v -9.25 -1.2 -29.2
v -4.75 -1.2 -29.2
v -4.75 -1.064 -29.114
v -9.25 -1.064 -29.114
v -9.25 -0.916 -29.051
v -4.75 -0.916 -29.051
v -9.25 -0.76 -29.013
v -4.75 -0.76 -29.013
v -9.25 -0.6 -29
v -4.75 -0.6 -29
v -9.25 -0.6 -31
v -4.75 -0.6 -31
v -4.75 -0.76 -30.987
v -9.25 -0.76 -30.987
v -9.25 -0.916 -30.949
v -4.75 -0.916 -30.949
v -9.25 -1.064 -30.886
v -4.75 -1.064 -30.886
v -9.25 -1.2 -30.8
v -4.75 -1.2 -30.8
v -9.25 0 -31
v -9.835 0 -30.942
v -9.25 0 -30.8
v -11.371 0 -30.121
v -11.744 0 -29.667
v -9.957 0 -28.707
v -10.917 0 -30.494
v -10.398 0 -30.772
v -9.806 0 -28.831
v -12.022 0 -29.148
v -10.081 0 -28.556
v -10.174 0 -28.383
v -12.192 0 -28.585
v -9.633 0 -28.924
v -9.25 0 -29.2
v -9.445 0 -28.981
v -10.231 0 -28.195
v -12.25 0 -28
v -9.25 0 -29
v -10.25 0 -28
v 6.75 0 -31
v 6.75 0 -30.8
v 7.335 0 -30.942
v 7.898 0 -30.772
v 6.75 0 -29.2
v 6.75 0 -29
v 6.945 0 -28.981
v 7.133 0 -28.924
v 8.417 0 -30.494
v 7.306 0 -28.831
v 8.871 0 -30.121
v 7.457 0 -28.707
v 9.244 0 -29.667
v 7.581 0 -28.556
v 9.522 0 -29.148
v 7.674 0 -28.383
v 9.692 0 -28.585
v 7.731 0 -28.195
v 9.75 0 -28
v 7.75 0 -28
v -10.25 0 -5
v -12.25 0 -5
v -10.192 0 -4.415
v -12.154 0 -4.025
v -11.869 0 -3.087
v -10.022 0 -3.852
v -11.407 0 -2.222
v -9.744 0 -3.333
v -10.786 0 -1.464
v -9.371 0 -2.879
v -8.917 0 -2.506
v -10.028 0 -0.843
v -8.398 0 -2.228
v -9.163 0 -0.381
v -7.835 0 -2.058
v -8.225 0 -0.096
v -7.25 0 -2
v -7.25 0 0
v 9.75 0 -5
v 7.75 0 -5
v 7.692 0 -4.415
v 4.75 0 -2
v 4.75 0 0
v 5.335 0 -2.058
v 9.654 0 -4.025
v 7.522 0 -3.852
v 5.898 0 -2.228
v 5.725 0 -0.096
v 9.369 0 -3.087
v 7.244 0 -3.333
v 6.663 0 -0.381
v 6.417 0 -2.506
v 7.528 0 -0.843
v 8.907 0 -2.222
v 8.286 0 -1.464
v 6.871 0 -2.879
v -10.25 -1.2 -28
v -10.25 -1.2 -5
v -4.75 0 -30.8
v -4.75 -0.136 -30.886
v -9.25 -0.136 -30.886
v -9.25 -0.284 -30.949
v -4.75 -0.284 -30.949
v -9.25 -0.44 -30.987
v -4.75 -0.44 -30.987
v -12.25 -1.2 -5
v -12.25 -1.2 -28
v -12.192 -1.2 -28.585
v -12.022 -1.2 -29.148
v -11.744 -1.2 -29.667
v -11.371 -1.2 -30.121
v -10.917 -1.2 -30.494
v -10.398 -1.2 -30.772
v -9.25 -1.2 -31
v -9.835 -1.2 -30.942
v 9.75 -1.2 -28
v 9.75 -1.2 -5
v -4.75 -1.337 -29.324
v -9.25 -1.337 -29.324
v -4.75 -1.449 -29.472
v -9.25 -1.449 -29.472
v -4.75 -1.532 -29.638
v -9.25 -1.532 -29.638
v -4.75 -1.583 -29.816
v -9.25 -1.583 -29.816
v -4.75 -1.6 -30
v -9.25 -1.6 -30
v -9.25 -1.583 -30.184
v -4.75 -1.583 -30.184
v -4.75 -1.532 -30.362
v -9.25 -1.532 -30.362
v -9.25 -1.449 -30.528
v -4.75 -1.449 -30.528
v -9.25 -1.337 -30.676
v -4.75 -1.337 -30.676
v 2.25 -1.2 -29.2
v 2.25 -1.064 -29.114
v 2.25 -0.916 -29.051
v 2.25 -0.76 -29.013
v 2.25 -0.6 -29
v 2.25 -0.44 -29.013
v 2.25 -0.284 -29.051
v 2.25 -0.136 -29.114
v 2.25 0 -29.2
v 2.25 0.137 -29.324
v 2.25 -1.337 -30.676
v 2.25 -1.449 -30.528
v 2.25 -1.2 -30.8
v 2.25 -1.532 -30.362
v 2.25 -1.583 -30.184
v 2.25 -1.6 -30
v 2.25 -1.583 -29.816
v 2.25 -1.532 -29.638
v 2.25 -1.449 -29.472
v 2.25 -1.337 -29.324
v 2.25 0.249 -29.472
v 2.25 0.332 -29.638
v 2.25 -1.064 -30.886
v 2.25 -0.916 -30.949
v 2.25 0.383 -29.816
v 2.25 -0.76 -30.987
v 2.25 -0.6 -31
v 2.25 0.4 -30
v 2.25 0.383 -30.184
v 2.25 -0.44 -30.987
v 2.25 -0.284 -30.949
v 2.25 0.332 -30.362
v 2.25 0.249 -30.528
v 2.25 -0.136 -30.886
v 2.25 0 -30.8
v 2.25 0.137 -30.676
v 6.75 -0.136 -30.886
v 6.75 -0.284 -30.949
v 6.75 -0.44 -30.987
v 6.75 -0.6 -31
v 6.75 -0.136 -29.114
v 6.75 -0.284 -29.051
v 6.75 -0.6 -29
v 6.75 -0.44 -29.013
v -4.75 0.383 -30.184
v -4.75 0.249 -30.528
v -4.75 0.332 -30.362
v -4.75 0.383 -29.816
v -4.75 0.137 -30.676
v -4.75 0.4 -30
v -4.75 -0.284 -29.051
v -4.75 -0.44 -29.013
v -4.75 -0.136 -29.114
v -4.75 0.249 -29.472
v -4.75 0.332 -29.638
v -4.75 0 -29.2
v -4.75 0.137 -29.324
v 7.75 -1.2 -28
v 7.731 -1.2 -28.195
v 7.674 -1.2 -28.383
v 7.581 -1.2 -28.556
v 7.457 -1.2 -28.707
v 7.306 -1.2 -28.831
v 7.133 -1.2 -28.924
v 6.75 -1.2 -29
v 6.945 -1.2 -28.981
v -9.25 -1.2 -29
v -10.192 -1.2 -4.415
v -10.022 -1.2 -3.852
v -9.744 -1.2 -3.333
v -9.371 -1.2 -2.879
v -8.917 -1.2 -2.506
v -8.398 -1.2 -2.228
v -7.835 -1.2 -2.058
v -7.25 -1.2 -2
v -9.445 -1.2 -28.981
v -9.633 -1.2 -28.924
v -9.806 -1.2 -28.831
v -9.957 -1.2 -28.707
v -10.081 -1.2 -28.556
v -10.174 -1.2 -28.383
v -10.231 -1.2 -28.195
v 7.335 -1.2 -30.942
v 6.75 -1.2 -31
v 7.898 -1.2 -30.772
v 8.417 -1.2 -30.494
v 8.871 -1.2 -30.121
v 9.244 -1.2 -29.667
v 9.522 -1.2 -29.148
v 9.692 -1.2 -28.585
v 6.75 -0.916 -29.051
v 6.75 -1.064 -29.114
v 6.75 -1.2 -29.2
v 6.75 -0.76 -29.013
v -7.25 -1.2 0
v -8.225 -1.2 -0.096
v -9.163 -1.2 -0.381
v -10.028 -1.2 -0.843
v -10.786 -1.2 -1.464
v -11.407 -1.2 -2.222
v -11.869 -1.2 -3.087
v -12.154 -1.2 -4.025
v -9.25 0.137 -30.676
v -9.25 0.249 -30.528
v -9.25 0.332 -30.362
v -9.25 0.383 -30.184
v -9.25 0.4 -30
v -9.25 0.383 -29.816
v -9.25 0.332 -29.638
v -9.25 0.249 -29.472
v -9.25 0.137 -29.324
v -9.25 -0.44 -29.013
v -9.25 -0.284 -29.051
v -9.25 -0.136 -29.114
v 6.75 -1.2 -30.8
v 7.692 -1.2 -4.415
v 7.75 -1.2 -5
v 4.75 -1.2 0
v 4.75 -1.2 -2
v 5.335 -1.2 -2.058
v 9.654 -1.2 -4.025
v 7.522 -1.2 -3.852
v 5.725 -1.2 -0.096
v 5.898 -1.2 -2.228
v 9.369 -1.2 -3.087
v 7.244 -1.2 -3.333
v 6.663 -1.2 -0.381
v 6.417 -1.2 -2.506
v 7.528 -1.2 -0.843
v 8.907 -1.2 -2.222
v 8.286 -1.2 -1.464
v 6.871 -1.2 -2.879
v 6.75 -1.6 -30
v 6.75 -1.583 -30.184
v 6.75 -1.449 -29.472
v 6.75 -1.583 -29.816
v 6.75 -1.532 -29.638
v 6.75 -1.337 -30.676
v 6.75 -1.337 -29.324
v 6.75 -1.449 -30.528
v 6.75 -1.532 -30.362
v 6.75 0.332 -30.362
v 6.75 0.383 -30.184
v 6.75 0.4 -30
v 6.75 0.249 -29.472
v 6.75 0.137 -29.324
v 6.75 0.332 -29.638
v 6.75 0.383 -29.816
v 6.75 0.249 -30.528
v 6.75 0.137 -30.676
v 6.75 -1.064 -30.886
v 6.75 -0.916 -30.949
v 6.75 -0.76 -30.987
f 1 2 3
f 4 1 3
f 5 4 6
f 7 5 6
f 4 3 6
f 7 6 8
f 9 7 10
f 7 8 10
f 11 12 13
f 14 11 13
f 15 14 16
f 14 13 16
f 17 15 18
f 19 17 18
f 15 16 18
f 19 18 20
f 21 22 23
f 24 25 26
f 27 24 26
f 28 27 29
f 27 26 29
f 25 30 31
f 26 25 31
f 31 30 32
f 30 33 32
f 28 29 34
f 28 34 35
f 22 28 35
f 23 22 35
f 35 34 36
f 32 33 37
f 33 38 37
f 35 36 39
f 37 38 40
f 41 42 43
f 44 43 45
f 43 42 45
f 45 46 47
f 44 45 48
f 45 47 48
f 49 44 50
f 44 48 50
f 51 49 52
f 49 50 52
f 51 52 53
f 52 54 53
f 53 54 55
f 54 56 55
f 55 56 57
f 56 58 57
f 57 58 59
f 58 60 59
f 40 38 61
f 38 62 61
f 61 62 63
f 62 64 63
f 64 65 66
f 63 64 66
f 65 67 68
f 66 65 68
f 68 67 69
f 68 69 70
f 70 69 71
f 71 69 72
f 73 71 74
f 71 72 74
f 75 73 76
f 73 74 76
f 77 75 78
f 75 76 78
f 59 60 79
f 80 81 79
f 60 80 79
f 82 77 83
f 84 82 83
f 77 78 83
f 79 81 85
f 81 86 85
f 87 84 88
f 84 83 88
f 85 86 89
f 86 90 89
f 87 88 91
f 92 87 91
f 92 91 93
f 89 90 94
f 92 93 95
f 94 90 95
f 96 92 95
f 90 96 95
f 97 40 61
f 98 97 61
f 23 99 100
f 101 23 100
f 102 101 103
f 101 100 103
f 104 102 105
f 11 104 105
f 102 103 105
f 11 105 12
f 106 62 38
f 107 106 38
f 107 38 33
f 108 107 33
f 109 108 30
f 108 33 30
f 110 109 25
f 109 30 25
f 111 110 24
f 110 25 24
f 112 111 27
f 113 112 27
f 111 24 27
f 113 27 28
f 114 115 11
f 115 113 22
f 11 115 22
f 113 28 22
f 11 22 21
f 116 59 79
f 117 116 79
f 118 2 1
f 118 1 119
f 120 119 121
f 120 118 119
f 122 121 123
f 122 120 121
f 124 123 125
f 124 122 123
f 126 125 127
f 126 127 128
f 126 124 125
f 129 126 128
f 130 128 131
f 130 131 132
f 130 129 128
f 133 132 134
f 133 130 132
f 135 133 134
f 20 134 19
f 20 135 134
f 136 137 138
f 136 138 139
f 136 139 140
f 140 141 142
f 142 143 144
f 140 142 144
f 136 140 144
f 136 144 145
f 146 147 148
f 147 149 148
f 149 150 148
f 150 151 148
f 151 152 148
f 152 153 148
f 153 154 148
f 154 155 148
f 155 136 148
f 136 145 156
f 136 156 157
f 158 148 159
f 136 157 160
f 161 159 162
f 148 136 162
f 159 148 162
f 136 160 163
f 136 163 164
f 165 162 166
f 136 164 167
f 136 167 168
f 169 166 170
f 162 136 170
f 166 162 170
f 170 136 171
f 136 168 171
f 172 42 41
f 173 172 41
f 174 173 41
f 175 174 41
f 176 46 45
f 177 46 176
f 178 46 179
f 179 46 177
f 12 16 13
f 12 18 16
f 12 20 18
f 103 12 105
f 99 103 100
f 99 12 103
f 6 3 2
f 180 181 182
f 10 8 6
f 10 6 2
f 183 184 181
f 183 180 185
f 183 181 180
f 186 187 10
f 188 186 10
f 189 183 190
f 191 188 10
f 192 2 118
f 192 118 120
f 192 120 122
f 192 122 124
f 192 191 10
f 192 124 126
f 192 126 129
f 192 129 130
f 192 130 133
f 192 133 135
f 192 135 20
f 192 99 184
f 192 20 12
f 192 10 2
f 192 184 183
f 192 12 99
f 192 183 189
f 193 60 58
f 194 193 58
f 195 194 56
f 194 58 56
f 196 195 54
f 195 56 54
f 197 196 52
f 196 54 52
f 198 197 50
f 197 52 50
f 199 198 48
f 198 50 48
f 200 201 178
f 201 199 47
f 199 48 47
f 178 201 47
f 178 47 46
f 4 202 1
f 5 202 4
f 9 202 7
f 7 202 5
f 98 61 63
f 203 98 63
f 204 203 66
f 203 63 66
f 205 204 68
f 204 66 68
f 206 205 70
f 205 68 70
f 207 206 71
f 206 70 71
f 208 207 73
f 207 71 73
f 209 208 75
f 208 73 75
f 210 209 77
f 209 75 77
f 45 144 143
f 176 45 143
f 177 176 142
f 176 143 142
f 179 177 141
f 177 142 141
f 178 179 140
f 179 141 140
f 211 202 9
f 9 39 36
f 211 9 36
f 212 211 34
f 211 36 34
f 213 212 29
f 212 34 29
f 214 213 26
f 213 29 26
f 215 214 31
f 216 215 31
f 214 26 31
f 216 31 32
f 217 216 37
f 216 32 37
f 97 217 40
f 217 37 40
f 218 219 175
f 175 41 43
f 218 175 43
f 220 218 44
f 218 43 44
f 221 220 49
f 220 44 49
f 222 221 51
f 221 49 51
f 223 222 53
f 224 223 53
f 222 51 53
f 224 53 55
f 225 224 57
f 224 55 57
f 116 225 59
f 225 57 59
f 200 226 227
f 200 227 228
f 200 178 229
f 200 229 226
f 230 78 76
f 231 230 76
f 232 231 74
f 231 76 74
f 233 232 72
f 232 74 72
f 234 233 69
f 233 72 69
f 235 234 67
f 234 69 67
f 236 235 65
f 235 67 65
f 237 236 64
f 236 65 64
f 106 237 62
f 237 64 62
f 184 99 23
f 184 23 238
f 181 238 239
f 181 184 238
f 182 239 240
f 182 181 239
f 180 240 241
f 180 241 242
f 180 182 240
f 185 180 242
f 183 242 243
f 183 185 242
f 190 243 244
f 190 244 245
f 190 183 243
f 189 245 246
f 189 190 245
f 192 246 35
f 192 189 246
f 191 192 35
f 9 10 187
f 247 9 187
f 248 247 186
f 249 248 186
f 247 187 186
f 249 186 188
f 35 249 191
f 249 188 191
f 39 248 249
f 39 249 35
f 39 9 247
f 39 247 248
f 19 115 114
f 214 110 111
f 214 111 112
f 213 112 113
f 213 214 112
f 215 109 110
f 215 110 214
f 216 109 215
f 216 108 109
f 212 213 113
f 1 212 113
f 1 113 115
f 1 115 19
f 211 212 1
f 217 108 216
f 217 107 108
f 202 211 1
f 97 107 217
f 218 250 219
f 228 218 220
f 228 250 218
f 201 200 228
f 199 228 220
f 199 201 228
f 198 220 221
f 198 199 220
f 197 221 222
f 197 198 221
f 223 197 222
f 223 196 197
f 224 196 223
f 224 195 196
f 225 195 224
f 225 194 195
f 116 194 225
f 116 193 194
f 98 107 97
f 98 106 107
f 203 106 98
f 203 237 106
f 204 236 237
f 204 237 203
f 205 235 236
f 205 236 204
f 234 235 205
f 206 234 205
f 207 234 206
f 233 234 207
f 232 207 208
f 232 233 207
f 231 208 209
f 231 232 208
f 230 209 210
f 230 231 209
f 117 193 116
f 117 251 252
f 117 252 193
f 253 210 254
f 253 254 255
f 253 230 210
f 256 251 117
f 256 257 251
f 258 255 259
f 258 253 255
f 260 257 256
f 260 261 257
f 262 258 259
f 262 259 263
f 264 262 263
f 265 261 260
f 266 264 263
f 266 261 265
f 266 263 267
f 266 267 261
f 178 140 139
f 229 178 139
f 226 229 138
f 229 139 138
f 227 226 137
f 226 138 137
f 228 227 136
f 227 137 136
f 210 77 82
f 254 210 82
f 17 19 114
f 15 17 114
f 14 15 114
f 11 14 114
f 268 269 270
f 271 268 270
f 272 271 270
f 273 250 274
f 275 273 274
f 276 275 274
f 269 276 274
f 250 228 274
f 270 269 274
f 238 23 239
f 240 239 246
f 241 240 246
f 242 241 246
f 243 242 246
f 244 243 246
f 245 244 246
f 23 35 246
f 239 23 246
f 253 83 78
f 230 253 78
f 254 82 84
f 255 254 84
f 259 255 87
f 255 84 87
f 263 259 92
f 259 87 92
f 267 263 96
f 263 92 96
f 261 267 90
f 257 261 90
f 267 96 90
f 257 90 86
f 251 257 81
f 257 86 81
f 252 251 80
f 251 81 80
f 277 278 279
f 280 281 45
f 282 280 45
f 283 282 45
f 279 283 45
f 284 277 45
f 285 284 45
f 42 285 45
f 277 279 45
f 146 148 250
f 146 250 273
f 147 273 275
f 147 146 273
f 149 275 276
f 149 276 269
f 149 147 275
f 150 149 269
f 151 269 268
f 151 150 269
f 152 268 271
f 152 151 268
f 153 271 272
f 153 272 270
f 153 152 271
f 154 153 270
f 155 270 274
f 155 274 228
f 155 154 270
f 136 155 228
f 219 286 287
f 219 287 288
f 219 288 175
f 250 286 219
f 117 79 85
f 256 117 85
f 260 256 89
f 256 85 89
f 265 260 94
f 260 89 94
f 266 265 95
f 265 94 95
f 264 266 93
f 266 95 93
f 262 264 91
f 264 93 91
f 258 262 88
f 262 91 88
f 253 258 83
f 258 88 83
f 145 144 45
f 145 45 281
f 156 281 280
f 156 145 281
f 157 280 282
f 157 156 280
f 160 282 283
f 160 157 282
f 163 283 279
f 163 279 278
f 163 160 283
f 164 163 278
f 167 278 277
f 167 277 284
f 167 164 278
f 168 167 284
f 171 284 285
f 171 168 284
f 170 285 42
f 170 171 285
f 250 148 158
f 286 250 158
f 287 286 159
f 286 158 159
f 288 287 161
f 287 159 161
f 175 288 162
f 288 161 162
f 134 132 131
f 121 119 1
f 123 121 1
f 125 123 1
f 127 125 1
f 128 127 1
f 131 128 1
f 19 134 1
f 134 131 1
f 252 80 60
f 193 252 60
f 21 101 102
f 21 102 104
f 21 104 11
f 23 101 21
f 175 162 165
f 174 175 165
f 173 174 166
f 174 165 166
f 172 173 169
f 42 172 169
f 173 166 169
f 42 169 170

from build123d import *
from build123d import SkipClean  # not in build123d's __all__

# Parameters (mm, degrees)
F1_DEPTH = 1.2
F3_DEPTH = 4.5
F4_DEPTH = 4.5
F6_DEPTH = 4.5
F7_DEPTH = 4.5


with BuildPart() as f1:
    # F0 (on Front) → F1 (new body)
    with BuildSketch(Plane.XZ):
        with BuildLine():
            Line((4.75, 0), (-7.25, 0))
            ThreePointArc((-7.25, 0), (-10.7855339059, -1.4644660941), (-12.25, -5))
            Line((-12.25, -5), (-12.25, -28))
            ThreePointArc((-12.25, -28), (-11.3713203436, -30.1213203436), (-9.25, -31))
            Line((-9.25, -31), (-4.75, -31))
            Line((-4.75, -31), (-4.75, -29))
            Line((-4.75, -29), (-9.25, -29))
            ThreePointArc((-9.25, -29), (-9.9571067812, -28.7071067812), (-10.25, -28))
            Line((-10.25, -28), (-10.25, -5))
            ThreePointArc((-10.25, -5), (-9.3713203436, -2.8786796564), (-7.25, -2))
            Line((-7.25, -2), (4.75, -2))
            ThreePointArc((4.75, -2), (6.8713203436, -2.8786796564), (7.75, -5))
            Line((7.75, -5), (7.75, -28))
            ThreePointArc((7.75, -28), (7.4571067812, -28.7071067812), (6.75, -29))
            Line((6.75, -29), (2.25, -29))
            Line((2.25, -29), (2.25, -31))
            Line((2.25, -31), (6.75, -31))
            ThreePointArc((6.75, -31), (8.8713203436, -30.1213203436), (9.75, -28))
            Line((9.75, -28), (9.75, -5))
            ThreePointArc((9.75, -5), (8.2855339059, -1.4644660941), (4.75, 0))
        make_face()
    extrude(amount=F1_DEPTH)

    # F2 (on face) → F3 (join)
    with BuildSketch(Plane.YZ.offset(-4.75)):
        with BuildLine():
            Line((-1.2, -30.8), (-1.2, -29.2))
            ThreePointArc((-1.2, -29.2), (-1.6, -30), (-1.2, -30.8))
        make_face()
        with BuildLine():
            ThreePointArc((-0.6, -29), (-0.916227766, -29.0513167019), (-1.2, -29.2))
            Line((-1.2, -29.2), (-1.2, -30.8))
            ThreePointArc((-1.2, -30.8), (-0.916227766, -30.9486832981), (-0.6, -31))
            ThreePointArc((-0.6, -31), (-0.283772234, -30.9486832981), (0, -30.8))
            Line((0, -30.8), (0, -29.2))
            ThreePointArc((0, -29.2), (-0.283772234, -29.0513167019), (-0.6, -29))
        make_face()
        with BuildLine():
            ThreePointArc((0.4, -30), (0.294427191, -29.5527864045), (0, -29.2))
            Line((0, -29.2), (0, -30.8))
            ThreePointArc((0, -30.8), (0.294427191, -30.4472135955), (0.4, -30))
        make_face()
    extrude(amount=-F3_DEPTH)

    # F2 (on face) → F4 (cut)
    with BuildSketch(Plane.YZ.offset(-4.75)):
        with BuildLine():
            Line((0, -29), (-0.6, -29))
            ThreePointArc((-0.6, -29), (-0.283772234, -29.0513167019), (0, -29.2))
            Line((0, -29.2), (0, -29))
        make_face()
        with BuildLine():
            Line((-0.6, -29), (-1.2, -29))
            Line((-1.2, -29), (-1.2, -29.2))
            ThreePointArc((-1.2, -29.2), (-0.916227766, -29.0513167019), (-0.6, -29))
        make_face()
        with BuildLine():
            ThreePointArc((0, -30.8), (-0.283772234, -30.9486832981), (-0.6, -31))
            Line((-0.6, -31), (0, -31))
            Line((0, -31), (0, -30.8))
        make_face()
        with BuildLine():
            ThreePointArc((-0.6, -31), (-0.916227766, -30.9486832981), (-1.2, -30.8))
            Line((-1.2, -30.8), (-1.2, -31))
            Line((-1.2, -31), (-0.6, -31))
        make_face()
    with SkipClean():  # cleaning this boolean's faces spoils the solid; the shape is the same uncleaned
        extrude(amount=-F4_DEPTH, mode=Mode.SUBTRACT)

    # F5 (on face) → F6 (join)
    with BuildSketch(Plane(origin=(2.25, 0, 0), x_dir=(0, -1, 0), z_dir=(-1, 0, 0))):
        with BuildLine():
            Line((1.2, -30.8), (1.2, -29.2))
            ThreePointArc((1.2, -29.2), (0.916227766, -29.0513167019), (0.6, -29))
            ThreePointArc((0.6, -29), (0.283772234, -29.0513167019), (0, -29.2))
            Line((0, -29.2), (0, -30.8))
            ThreePointArc((0, -30.8), (0.283772234, -30.9486832981), (0.6, -31))
            ThreePointArc((0.6, -31), (0.916227766, -30.9486832981), (1.2, -30.8))
        make_face()
        with BuildLine():
            Line((0, -30.8), (0, -29.2))
            ThreePointArc((0, -29.2), (-0.4, -30), (0, -30.8))
        make_face()
        with BuildLine():
            ThreePointArc((1.6, -30), (1.494427191, -29.5527864045), (1.2, -29.2))
            Line((1.2, -29.2), (1.2, -30.8))
            ThreePointArc((1.2, -30.8), (1.494427191, -30.4472135955), (1.6, -30))
        make_face()
    extrude(amount=-F6_DEPTH)

    # F5 (on face) → F7 (cut)
    with BuildSketch(Plane(origin=(2.25, 0, 0), x_dir=(0, -1, 0), z_dir=(-1, 0, 0))):
        with BuildLine():
            ThreePointArc((0, -29.2), (0.283772234, -29.0513167019), (0.6, -29))
            Line((0.6, -29), (0, -29))
            Line((0, -29), (0, -29.2))
        make_face()
        with BuildLine():
            Line((1.2, -29.2), (1.2, -29))
            Line((1.2, -29), (0.6, -29))
            ThreePointArc((0.6, -29), (0.916227766, -29.0513167019), (1.2, -29.2))
        make_face()
        with BuildLine():
            Line((0, -31), (0.6, -31))
            ThreePointArc((0.6, -31), (0.283772234, -30.9486832981), (0, -30.8))
            Line((0, -30.8), (0, -31))
        make_face()
        with BuildLine():
            Line((1.2, -31), (1.2, -30.8))
            ThreePointArc((1.2, -30.8), (0.916227766, -30.9486832981), (0.6, -31))
            Line((0.6, -31), (1.2, -31))
        make_face()
    with SkipClean():  # cleaning this boolean's faces spoils the solid; the shape is the same uncleaned
        extrude(amount=-F7_DEPTH, mode=Mode.SUBTRACT)


solid = f1.part
